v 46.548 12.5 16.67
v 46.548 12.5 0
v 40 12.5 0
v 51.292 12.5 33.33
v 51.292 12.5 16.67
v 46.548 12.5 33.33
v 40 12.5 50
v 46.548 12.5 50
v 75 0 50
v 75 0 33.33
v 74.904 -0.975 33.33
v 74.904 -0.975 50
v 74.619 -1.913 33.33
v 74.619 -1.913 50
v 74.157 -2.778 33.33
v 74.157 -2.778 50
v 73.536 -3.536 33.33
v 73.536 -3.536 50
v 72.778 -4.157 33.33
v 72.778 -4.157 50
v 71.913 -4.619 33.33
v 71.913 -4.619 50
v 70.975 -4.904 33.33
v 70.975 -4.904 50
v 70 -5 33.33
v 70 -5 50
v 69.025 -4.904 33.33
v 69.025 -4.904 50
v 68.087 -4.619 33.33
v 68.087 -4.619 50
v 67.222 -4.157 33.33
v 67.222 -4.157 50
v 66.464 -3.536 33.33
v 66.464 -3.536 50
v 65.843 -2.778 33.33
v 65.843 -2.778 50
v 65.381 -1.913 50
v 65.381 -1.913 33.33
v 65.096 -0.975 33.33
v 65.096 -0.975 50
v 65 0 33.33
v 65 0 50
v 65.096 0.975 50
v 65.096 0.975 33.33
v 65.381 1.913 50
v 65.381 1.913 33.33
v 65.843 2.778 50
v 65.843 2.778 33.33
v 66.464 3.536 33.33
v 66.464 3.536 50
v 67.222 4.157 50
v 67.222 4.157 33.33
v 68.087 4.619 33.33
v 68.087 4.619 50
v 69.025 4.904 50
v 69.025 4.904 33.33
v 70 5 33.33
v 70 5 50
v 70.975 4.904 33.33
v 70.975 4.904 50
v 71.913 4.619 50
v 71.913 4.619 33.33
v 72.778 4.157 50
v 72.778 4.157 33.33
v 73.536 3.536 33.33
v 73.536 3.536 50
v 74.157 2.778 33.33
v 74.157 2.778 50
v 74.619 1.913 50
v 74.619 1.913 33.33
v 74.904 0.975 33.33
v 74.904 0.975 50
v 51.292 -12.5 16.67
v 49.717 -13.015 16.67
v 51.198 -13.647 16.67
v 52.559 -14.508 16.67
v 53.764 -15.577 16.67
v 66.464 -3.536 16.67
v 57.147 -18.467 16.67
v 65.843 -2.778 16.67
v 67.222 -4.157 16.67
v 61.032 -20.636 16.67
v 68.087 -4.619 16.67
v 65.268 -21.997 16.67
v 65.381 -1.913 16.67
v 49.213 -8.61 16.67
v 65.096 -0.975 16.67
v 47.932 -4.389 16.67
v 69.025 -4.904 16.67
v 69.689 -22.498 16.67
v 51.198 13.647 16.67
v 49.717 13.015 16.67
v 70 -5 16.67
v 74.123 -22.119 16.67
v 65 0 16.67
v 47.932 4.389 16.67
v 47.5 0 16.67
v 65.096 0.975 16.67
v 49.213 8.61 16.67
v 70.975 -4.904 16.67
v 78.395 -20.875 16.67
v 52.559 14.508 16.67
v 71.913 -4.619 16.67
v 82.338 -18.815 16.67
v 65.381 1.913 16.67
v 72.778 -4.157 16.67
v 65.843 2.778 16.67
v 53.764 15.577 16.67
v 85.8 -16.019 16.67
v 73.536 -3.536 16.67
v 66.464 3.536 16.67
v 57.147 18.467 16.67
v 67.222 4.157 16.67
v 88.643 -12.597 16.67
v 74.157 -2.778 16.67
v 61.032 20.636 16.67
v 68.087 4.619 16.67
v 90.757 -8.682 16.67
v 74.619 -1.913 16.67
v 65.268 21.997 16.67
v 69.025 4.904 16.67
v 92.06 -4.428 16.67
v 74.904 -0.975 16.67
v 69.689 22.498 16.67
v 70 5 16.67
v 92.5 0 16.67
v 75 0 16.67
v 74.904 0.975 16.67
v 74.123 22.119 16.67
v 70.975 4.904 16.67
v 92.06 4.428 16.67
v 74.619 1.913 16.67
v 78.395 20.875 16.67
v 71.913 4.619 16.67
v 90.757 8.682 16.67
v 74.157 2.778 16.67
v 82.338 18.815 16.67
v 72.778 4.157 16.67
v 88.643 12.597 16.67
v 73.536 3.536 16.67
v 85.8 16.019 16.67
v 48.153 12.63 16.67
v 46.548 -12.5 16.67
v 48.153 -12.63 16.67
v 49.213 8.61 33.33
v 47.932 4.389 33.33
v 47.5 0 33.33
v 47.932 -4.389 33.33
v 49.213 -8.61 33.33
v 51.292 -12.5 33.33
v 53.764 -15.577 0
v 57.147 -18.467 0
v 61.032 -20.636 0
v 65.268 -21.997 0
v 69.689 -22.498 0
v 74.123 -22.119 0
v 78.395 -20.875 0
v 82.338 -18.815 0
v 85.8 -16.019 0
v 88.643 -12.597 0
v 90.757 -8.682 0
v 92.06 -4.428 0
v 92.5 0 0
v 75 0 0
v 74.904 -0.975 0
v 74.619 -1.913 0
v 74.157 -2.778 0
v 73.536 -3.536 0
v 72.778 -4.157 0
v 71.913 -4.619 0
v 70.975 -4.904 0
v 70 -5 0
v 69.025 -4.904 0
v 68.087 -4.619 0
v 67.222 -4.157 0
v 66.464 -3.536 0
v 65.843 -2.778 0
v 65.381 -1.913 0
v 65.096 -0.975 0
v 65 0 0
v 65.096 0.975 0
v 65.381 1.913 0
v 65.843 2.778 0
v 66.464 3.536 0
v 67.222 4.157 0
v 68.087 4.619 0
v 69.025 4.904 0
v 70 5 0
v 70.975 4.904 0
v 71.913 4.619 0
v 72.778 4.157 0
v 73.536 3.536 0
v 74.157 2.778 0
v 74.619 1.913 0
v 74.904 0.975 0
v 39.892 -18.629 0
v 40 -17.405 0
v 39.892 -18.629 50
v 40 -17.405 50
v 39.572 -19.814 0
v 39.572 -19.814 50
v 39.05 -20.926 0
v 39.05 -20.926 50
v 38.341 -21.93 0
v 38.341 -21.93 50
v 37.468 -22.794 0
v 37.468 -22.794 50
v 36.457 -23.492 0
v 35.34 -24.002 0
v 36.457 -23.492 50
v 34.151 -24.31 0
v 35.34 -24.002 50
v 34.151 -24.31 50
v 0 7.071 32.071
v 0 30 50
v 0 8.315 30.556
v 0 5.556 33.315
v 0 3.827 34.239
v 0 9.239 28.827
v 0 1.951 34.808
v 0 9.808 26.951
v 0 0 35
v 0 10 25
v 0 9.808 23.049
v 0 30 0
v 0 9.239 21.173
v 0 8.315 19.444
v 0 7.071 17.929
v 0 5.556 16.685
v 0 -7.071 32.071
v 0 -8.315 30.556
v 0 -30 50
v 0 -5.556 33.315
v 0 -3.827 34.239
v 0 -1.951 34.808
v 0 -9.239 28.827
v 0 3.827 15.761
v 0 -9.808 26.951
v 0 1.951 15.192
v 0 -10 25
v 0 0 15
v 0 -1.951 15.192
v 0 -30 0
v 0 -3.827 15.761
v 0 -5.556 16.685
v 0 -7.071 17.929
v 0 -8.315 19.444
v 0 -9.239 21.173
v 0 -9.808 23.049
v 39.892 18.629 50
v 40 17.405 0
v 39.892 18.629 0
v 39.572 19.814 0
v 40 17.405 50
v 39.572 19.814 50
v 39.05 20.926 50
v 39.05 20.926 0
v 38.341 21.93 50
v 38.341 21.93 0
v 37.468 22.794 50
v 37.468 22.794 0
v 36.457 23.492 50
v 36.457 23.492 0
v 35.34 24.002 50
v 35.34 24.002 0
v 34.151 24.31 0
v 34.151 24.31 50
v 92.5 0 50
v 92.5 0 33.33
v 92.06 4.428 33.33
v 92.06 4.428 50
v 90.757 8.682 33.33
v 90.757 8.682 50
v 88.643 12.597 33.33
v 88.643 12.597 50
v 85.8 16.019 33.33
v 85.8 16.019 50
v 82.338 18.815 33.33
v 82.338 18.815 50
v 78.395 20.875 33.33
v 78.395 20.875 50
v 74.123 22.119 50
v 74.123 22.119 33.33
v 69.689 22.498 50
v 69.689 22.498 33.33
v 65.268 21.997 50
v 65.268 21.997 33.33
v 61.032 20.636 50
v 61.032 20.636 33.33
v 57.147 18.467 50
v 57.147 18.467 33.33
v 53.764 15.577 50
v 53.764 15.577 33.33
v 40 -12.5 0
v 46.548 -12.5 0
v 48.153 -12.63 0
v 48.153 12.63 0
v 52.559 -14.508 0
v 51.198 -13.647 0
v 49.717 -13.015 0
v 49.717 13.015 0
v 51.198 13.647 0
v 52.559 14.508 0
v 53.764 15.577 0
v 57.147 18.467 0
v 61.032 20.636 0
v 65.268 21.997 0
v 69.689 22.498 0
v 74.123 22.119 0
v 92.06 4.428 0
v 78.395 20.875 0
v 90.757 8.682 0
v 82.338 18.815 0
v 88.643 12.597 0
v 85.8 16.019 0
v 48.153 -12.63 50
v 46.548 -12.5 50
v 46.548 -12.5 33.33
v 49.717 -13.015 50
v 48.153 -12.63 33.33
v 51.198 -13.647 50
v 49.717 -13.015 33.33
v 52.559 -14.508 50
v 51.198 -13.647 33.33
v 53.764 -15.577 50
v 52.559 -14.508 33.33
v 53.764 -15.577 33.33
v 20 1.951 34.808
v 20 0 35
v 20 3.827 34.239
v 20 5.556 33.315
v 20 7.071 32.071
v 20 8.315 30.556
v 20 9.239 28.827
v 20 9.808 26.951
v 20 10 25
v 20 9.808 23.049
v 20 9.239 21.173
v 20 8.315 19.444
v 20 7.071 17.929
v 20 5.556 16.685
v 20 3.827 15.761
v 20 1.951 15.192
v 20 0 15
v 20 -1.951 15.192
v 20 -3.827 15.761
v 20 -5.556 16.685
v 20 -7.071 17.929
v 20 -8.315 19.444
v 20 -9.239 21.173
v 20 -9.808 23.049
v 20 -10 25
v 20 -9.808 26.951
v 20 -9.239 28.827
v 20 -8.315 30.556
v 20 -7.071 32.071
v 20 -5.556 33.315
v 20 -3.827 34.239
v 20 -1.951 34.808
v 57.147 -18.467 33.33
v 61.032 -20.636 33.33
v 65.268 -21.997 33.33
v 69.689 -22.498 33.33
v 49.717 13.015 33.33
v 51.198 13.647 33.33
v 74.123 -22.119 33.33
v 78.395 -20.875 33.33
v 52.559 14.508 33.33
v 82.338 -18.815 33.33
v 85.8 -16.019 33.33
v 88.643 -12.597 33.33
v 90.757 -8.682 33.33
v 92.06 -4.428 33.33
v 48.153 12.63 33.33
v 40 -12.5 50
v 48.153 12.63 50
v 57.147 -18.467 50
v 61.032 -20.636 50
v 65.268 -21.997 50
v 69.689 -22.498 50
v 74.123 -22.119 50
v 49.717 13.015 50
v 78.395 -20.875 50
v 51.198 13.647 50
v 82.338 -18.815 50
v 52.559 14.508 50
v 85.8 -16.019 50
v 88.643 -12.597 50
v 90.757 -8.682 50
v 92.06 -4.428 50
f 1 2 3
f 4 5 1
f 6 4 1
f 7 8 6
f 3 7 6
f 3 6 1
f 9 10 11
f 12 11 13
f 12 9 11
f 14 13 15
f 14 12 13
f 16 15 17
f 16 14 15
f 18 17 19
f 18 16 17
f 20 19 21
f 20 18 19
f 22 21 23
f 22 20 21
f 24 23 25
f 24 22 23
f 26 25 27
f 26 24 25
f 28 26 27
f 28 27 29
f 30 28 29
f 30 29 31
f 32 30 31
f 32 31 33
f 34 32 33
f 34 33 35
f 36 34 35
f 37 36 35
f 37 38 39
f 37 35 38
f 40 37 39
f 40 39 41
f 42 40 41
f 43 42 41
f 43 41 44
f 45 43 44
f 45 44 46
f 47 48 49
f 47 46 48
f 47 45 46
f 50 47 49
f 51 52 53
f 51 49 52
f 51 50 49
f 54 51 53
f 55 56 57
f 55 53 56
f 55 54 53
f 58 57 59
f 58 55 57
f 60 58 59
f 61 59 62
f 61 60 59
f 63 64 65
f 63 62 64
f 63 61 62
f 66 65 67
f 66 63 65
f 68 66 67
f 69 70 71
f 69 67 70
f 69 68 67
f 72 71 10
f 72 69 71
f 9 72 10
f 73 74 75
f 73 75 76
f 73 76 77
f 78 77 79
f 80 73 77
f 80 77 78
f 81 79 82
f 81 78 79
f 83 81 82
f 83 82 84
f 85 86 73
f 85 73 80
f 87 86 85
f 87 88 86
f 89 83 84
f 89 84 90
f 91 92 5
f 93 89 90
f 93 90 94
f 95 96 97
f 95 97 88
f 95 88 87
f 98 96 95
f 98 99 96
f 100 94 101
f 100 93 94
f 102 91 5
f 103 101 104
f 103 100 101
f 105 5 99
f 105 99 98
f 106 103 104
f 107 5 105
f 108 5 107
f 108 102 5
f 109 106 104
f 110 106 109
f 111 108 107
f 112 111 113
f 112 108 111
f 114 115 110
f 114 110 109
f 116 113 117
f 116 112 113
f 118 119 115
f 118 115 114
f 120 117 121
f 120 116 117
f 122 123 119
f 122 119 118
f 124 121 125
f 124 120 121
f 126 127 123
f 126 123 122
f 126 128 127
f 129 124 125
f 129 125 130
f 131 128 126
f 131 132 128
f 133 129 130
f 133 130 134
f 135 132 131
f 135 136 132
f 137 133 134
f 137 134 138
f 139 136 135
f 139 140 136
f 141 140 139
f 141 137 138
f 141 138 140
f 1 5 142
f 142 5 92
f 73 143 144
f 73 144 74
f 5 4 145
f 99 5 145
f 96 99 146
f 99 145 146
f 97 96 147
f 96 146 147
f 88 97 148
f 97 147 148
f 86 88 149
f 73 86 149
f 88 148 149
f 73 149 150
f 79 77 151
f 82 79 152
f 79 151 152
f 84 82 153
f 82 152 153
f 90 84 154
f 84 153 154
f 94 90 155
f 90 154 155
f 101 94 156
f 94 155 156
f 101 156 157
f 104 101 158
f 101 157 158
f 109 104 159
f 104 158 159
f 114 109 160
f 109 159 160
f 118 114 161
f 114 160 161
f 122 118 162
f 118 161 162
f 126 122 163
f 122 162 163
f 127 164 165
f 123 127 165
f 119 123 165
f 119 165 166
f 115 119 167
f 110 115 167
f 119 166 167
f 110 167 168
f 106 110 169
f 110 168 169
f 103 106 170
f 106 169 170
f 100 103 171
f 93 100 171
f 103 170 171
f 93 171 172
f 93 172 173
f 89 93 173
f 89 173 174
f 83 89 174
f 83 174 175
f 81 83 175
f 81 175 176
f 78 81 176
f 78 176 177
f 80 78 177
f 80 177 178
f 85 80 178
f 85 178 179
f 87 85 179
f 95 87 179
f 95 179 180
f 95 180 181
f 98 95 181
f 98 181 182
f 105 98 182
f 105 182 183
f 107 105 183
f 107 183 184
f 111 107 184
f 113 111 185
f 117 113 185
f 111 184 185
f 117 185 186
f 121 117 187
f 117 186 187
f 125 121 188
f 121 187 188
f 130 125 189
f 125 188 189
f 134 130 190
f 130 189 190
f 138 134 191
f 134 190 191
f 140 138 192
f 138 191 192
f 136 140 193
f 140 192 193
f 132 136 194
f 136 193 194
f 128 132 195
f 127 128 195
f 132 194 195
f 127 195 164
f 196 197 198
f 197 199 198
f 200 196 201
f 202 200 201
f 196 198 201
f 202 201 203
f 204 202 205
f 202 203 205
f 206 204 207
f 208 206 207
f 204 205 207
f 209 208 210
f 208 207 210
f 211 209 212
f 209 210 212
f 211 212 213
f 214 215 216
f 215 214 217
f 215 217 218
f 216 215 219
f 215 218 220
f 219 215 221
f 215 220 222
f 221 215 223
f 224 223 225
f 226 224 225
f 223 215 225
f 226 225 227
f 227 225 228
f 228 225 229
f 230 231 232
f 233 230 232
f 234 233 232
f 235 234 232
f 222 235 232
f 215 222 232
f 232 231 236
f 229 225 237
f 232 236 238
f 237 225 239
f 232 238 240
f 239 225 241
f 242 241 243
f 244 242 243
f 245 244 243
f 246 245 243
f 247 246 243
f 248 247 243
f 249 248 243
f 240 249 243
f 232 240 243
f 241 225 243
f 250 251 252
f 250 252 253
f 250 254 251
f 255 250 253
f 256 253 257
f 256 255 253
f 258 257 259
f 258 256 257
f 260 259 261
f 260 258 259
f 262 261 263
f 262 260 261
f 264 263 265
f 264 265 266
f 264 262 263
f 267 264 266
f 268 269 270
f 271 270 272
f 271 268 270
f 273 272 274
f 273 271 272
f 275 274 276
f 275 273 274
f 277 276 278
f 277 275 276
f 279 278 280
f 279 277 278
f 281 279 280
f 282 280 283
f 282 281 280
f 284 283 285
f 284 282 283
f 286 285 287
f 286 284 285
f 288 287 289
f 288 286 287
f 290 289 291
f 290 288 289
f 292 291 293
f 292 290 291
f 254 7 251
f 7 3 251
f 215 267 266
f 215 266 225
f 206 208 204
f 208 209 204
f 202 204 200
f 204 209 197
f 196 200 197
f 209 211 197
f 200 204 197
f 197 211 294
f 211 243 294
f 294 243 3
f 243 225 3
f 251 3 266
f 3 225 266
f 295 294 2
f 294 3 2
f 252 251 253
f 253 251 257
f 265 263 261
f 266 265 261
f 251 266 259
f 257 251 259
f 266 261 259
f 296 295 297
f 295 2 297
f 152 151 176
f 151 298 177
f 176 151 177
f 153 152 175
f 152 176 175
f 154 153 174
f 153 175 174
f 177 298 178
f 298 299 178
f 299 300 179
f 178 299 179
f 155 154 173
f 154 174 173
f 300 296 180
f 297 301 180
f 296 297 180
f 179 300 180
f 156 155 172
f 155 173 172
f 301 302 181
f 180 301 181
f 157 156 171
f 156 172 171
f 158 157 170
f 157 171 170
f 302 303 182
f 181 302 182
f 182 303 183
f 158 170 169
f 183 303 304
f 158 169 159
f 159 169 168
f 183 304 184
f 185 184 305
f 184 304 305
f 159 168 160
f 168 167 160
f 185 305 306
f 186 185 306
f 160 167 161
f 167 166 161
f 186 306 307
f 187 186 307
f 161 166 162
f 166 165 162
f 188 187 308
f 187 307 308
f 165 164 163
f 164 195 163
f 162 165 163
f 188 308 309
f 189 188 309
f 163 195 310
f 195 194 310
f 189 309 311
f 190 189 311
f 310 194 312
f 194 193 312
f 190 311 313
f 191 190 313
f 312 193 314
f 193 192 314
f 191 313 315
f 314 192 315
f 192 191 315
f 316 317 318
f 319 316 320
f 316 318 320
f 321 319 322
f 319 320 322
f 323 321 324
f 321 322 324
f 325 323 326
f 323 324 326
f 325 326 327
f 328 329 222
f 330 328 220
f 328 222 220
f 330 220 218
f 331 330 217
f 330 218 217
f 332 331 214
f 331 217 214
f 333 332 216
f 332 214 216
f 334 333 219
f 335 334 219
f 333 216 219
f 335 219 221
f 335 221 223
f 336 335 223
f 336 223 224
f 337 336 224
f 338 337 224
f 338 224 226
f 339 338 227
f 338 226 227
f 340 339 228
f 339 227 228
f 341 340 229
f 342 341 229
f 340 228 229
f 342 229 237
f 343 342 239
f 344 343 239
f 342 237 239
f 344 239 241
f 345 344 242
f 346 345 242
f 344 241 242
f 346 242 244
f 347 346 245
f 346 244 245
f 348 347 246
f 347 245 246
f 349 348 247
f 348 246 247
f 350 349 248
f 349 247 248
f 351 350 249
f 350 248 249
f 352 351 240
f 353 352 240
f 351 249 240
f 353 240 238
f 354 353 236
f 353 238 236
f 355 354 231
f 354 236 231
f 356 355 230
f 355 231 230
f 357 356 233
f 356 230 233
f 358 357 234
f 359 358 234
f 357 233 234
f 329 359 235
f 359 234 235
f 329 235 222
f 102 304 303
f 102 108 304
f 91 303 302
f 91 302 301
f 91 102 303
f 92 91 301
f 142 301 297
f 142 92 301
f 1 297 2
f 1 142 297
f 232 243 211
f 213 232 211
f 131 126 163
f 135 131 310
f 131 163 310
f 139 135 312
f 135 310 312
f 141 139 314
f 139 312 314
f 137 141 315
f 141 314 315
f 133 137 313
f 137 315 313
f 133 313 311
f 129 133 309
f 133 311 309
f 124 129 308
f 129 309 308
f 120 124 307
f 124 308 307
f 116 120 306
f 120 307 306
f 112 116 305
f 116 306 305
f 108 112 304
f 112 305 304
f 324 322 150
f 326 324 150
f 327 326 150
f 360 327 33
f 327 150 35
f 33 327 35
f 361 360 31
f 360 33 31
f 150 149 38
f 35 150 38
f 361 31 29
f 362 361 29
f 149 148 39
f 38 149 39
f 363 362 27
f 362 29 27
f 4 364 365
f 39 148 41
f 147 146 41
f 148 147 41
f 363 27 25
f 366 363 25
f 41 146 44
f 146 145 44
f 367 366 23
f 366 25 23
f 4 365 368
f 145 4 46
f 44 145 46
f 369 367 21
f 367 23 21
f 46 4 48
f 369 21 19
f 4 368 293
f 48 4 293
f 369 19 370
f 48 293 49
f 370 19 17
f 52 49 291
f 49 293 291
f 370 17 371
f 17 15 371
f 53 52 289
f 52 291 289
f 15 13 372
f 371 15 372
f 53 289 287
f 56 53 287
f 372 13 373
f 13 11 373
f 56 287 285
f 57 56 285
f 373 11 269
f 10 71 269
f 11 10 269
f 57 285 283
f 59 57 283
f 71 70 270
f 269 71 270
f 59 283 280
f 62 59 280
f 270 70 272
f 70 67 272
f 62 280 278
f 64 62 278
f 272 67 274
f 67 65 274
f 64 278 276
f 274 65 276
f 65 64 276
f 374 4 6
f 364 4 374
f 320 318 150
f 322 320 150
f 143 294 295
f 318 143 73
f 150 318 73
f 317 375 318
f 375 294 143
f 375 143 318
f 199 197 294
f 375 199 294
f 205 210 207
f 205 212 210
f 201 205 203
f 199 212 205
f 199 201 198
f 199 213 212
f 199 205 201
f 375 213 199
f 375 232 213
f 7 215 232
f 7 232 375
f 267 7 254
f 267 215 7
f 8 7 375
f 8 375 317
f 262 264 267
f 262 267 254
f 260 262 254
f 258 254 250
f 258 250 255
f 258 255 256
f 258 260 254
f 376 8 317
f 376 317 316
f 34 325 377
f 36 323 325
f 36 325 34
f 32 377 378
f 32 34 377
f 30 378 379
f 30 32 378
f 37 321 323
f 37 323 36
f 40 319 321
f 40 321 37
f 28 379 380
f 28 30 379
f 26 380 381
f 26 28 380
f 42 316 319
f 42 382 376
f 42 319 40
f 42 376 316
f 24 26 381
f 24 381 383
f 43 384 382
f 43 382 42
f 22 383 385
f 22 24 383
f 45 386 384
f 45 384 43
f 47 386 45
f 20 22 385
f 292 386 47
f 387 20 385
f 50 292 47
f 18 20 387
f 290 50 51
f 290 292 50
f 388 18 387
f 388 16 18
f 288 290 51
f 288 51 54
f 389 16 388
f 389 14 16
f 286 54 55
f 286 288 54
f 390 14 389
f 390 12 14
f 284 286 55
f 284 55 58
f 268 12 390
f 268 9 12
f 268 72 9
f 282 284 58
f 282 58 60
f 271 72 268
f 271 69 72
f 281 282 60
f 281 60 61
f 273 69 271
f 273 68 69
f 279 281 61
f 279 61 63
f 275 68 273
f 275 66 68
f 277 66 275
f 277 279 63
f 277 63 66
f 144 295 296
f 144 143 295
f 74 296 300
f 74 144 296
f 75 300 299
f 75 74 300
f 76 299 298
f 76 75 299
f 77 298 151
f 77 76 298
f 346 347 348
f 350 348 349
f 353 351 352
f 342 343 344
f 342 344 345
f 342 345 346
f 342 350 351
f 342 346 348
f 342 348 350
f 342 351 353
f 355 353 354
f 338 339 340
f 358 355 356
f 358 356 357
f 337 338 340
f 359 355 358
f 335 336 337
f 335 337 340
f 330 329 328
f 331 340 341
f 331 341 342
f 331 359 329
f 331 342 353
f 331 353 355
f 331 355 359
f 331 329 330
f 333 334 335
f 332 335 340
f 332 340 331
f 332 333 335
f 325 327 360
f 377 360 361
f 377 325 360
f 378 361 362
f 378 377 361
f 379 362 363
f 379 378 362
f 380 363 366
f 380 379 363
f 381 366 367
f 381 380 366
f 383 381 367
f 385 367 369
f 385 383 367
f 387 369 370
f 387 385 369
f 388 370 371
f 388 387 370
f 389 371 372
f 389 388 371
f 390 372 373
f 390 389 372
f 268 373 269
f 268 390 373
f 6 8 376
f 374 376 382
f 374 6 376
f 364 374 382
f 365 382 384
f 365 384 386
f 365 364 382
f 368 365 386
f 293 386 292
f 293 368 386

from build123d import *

# Parameters (mm, degrees)
BOSS_EXTRUDE1_DEPTH = 50
BOSS_EXTRUDE2_DEPTH = 25
CUT_EXTRUDE1_START  = -8.33
SKETCH3_R           = 22.5
CUT_EXTRUDE1_DEPTH  = 8.33
FILLET1_R           = 10
FILLET2_R           = 7
SKETCH4_R           = 10
CUT_EXTRUDE2_DEPTH  = 20


with BuildPart() as part:
    # Sketch1 → Boss-Extrude1 (new body)
    with BuildSketch(Plane.XY):
        Polygon((0, 30), (0, -30), (40, -23.334999563), (40, 23.334999563), align=None)
    extrude(amount=BOSS_EXTRUDE1_DEPTH)

    # Sketch2 → Boss-Extrude2 (add)
    with BuildSketch(Plane.XY):
        with BuildLine():
            Line((40, 0), (47.5, 0))
            ThreePointArc((47.5, 0), (48.4687848, 6.5312152), (51.291713066, 12.5))
            Line((51.291713066, 12.5), (40, 12.5))
            Line((40, 12.5), (40, 0))
        make_face()
        with BuildLine():
            Line((40, -12.5), (51.291713066, -12.5))
            ThreePointArc((51.291713066, -12.5), (48.4687848, -6.5312152), (47.5, 0))
            Line((47.5, 0), (40, 0))
            Line((40, 0), (40, -12.5))
        make_face()
        with BuildLine():
            ThreePointArc((47.5, 0), (48.4687848, -6.5312152), (51.291713066, -12.5))
            ThreePointArc((51.291713066, -12.5), (76.5312152, -21.5312152), (92.5, 0))
            Line((92.5, 0), (75, 0))
            ThreePointArc((75, 0), (70, -5), (65, 0))
            Line((65, 0), (47.5, 0))
        make_face()
        with BuildLine():
            Line((75, 0), (92.5, 0))
            ThreePointArc((92.5, 0), (76.5312152, 21.5312152), (51.291713066, 12.5))
            ThreePointArc((51.291713066, 12.5), (48.4687848, 6.5312152), (47.5, 0))
            Line((47.5, 0), (65, 0))
            ThreePointArc((65, 0), (70, 5), (75, 0))
        make_face()
    boss_extrude2 = extrude(amount=BOSS_EXTRUDE2_DEPTH)

    # Sketch3 → Cut-Extrude1 (cut)
    with BuildSketch(Plane.XY.offset(25).offset(CUT_EXTRUDE1_START)):
        with Locations((70, 0)):
            Circle(SKETCH3_R)
    cut_extrude1 = extrude(amount=CUT_EXTRUDE1_DEPTH, mode=Mode.SUBTRACT)

    # Mirror1: Boss-Extrude2, Cut-Extrude1 across plane
    add(boss_extrude2.mirror(Plane.XY.offset(25)))
    add(cut_extrude1.mirror(Plane.XY.offset(25)), mode=Mode.SUBTRACT)

    # Fillet1
    fillet1_edges = [part.edges().sort_by_distance(p)[0] for p in [
        (51.291713066, 12.5, 8.335),
        (51.291713066, -12.5, 8.335),
        (51.291713066, -12.5, 41.665),
        (51.291713066, 12.5, 41.665),
    ]]
    fillet(fillet1_edges, radius=FILLET1_R)

    # Fillet2
    fillet2_edges = [part.edges().sort_by_distance(p)[0] for p in [
        (40, 23.334999563, 25),
        (40, -23.334999563, 25),
    ]]
    fillet(fillet2_edges, radius=FILLET2_R)

    # Sketch4 → Cut-Extrude2 (cut)
    with BuildSketch(Plane.ZY):
        with Locations((25, 0)):
            Circle(SKETCH4_R)
    extrude(amount=-CUT_EXTRUDE2_DEPTH, mode=Mode.SUBTRACT)


solid = part.part
